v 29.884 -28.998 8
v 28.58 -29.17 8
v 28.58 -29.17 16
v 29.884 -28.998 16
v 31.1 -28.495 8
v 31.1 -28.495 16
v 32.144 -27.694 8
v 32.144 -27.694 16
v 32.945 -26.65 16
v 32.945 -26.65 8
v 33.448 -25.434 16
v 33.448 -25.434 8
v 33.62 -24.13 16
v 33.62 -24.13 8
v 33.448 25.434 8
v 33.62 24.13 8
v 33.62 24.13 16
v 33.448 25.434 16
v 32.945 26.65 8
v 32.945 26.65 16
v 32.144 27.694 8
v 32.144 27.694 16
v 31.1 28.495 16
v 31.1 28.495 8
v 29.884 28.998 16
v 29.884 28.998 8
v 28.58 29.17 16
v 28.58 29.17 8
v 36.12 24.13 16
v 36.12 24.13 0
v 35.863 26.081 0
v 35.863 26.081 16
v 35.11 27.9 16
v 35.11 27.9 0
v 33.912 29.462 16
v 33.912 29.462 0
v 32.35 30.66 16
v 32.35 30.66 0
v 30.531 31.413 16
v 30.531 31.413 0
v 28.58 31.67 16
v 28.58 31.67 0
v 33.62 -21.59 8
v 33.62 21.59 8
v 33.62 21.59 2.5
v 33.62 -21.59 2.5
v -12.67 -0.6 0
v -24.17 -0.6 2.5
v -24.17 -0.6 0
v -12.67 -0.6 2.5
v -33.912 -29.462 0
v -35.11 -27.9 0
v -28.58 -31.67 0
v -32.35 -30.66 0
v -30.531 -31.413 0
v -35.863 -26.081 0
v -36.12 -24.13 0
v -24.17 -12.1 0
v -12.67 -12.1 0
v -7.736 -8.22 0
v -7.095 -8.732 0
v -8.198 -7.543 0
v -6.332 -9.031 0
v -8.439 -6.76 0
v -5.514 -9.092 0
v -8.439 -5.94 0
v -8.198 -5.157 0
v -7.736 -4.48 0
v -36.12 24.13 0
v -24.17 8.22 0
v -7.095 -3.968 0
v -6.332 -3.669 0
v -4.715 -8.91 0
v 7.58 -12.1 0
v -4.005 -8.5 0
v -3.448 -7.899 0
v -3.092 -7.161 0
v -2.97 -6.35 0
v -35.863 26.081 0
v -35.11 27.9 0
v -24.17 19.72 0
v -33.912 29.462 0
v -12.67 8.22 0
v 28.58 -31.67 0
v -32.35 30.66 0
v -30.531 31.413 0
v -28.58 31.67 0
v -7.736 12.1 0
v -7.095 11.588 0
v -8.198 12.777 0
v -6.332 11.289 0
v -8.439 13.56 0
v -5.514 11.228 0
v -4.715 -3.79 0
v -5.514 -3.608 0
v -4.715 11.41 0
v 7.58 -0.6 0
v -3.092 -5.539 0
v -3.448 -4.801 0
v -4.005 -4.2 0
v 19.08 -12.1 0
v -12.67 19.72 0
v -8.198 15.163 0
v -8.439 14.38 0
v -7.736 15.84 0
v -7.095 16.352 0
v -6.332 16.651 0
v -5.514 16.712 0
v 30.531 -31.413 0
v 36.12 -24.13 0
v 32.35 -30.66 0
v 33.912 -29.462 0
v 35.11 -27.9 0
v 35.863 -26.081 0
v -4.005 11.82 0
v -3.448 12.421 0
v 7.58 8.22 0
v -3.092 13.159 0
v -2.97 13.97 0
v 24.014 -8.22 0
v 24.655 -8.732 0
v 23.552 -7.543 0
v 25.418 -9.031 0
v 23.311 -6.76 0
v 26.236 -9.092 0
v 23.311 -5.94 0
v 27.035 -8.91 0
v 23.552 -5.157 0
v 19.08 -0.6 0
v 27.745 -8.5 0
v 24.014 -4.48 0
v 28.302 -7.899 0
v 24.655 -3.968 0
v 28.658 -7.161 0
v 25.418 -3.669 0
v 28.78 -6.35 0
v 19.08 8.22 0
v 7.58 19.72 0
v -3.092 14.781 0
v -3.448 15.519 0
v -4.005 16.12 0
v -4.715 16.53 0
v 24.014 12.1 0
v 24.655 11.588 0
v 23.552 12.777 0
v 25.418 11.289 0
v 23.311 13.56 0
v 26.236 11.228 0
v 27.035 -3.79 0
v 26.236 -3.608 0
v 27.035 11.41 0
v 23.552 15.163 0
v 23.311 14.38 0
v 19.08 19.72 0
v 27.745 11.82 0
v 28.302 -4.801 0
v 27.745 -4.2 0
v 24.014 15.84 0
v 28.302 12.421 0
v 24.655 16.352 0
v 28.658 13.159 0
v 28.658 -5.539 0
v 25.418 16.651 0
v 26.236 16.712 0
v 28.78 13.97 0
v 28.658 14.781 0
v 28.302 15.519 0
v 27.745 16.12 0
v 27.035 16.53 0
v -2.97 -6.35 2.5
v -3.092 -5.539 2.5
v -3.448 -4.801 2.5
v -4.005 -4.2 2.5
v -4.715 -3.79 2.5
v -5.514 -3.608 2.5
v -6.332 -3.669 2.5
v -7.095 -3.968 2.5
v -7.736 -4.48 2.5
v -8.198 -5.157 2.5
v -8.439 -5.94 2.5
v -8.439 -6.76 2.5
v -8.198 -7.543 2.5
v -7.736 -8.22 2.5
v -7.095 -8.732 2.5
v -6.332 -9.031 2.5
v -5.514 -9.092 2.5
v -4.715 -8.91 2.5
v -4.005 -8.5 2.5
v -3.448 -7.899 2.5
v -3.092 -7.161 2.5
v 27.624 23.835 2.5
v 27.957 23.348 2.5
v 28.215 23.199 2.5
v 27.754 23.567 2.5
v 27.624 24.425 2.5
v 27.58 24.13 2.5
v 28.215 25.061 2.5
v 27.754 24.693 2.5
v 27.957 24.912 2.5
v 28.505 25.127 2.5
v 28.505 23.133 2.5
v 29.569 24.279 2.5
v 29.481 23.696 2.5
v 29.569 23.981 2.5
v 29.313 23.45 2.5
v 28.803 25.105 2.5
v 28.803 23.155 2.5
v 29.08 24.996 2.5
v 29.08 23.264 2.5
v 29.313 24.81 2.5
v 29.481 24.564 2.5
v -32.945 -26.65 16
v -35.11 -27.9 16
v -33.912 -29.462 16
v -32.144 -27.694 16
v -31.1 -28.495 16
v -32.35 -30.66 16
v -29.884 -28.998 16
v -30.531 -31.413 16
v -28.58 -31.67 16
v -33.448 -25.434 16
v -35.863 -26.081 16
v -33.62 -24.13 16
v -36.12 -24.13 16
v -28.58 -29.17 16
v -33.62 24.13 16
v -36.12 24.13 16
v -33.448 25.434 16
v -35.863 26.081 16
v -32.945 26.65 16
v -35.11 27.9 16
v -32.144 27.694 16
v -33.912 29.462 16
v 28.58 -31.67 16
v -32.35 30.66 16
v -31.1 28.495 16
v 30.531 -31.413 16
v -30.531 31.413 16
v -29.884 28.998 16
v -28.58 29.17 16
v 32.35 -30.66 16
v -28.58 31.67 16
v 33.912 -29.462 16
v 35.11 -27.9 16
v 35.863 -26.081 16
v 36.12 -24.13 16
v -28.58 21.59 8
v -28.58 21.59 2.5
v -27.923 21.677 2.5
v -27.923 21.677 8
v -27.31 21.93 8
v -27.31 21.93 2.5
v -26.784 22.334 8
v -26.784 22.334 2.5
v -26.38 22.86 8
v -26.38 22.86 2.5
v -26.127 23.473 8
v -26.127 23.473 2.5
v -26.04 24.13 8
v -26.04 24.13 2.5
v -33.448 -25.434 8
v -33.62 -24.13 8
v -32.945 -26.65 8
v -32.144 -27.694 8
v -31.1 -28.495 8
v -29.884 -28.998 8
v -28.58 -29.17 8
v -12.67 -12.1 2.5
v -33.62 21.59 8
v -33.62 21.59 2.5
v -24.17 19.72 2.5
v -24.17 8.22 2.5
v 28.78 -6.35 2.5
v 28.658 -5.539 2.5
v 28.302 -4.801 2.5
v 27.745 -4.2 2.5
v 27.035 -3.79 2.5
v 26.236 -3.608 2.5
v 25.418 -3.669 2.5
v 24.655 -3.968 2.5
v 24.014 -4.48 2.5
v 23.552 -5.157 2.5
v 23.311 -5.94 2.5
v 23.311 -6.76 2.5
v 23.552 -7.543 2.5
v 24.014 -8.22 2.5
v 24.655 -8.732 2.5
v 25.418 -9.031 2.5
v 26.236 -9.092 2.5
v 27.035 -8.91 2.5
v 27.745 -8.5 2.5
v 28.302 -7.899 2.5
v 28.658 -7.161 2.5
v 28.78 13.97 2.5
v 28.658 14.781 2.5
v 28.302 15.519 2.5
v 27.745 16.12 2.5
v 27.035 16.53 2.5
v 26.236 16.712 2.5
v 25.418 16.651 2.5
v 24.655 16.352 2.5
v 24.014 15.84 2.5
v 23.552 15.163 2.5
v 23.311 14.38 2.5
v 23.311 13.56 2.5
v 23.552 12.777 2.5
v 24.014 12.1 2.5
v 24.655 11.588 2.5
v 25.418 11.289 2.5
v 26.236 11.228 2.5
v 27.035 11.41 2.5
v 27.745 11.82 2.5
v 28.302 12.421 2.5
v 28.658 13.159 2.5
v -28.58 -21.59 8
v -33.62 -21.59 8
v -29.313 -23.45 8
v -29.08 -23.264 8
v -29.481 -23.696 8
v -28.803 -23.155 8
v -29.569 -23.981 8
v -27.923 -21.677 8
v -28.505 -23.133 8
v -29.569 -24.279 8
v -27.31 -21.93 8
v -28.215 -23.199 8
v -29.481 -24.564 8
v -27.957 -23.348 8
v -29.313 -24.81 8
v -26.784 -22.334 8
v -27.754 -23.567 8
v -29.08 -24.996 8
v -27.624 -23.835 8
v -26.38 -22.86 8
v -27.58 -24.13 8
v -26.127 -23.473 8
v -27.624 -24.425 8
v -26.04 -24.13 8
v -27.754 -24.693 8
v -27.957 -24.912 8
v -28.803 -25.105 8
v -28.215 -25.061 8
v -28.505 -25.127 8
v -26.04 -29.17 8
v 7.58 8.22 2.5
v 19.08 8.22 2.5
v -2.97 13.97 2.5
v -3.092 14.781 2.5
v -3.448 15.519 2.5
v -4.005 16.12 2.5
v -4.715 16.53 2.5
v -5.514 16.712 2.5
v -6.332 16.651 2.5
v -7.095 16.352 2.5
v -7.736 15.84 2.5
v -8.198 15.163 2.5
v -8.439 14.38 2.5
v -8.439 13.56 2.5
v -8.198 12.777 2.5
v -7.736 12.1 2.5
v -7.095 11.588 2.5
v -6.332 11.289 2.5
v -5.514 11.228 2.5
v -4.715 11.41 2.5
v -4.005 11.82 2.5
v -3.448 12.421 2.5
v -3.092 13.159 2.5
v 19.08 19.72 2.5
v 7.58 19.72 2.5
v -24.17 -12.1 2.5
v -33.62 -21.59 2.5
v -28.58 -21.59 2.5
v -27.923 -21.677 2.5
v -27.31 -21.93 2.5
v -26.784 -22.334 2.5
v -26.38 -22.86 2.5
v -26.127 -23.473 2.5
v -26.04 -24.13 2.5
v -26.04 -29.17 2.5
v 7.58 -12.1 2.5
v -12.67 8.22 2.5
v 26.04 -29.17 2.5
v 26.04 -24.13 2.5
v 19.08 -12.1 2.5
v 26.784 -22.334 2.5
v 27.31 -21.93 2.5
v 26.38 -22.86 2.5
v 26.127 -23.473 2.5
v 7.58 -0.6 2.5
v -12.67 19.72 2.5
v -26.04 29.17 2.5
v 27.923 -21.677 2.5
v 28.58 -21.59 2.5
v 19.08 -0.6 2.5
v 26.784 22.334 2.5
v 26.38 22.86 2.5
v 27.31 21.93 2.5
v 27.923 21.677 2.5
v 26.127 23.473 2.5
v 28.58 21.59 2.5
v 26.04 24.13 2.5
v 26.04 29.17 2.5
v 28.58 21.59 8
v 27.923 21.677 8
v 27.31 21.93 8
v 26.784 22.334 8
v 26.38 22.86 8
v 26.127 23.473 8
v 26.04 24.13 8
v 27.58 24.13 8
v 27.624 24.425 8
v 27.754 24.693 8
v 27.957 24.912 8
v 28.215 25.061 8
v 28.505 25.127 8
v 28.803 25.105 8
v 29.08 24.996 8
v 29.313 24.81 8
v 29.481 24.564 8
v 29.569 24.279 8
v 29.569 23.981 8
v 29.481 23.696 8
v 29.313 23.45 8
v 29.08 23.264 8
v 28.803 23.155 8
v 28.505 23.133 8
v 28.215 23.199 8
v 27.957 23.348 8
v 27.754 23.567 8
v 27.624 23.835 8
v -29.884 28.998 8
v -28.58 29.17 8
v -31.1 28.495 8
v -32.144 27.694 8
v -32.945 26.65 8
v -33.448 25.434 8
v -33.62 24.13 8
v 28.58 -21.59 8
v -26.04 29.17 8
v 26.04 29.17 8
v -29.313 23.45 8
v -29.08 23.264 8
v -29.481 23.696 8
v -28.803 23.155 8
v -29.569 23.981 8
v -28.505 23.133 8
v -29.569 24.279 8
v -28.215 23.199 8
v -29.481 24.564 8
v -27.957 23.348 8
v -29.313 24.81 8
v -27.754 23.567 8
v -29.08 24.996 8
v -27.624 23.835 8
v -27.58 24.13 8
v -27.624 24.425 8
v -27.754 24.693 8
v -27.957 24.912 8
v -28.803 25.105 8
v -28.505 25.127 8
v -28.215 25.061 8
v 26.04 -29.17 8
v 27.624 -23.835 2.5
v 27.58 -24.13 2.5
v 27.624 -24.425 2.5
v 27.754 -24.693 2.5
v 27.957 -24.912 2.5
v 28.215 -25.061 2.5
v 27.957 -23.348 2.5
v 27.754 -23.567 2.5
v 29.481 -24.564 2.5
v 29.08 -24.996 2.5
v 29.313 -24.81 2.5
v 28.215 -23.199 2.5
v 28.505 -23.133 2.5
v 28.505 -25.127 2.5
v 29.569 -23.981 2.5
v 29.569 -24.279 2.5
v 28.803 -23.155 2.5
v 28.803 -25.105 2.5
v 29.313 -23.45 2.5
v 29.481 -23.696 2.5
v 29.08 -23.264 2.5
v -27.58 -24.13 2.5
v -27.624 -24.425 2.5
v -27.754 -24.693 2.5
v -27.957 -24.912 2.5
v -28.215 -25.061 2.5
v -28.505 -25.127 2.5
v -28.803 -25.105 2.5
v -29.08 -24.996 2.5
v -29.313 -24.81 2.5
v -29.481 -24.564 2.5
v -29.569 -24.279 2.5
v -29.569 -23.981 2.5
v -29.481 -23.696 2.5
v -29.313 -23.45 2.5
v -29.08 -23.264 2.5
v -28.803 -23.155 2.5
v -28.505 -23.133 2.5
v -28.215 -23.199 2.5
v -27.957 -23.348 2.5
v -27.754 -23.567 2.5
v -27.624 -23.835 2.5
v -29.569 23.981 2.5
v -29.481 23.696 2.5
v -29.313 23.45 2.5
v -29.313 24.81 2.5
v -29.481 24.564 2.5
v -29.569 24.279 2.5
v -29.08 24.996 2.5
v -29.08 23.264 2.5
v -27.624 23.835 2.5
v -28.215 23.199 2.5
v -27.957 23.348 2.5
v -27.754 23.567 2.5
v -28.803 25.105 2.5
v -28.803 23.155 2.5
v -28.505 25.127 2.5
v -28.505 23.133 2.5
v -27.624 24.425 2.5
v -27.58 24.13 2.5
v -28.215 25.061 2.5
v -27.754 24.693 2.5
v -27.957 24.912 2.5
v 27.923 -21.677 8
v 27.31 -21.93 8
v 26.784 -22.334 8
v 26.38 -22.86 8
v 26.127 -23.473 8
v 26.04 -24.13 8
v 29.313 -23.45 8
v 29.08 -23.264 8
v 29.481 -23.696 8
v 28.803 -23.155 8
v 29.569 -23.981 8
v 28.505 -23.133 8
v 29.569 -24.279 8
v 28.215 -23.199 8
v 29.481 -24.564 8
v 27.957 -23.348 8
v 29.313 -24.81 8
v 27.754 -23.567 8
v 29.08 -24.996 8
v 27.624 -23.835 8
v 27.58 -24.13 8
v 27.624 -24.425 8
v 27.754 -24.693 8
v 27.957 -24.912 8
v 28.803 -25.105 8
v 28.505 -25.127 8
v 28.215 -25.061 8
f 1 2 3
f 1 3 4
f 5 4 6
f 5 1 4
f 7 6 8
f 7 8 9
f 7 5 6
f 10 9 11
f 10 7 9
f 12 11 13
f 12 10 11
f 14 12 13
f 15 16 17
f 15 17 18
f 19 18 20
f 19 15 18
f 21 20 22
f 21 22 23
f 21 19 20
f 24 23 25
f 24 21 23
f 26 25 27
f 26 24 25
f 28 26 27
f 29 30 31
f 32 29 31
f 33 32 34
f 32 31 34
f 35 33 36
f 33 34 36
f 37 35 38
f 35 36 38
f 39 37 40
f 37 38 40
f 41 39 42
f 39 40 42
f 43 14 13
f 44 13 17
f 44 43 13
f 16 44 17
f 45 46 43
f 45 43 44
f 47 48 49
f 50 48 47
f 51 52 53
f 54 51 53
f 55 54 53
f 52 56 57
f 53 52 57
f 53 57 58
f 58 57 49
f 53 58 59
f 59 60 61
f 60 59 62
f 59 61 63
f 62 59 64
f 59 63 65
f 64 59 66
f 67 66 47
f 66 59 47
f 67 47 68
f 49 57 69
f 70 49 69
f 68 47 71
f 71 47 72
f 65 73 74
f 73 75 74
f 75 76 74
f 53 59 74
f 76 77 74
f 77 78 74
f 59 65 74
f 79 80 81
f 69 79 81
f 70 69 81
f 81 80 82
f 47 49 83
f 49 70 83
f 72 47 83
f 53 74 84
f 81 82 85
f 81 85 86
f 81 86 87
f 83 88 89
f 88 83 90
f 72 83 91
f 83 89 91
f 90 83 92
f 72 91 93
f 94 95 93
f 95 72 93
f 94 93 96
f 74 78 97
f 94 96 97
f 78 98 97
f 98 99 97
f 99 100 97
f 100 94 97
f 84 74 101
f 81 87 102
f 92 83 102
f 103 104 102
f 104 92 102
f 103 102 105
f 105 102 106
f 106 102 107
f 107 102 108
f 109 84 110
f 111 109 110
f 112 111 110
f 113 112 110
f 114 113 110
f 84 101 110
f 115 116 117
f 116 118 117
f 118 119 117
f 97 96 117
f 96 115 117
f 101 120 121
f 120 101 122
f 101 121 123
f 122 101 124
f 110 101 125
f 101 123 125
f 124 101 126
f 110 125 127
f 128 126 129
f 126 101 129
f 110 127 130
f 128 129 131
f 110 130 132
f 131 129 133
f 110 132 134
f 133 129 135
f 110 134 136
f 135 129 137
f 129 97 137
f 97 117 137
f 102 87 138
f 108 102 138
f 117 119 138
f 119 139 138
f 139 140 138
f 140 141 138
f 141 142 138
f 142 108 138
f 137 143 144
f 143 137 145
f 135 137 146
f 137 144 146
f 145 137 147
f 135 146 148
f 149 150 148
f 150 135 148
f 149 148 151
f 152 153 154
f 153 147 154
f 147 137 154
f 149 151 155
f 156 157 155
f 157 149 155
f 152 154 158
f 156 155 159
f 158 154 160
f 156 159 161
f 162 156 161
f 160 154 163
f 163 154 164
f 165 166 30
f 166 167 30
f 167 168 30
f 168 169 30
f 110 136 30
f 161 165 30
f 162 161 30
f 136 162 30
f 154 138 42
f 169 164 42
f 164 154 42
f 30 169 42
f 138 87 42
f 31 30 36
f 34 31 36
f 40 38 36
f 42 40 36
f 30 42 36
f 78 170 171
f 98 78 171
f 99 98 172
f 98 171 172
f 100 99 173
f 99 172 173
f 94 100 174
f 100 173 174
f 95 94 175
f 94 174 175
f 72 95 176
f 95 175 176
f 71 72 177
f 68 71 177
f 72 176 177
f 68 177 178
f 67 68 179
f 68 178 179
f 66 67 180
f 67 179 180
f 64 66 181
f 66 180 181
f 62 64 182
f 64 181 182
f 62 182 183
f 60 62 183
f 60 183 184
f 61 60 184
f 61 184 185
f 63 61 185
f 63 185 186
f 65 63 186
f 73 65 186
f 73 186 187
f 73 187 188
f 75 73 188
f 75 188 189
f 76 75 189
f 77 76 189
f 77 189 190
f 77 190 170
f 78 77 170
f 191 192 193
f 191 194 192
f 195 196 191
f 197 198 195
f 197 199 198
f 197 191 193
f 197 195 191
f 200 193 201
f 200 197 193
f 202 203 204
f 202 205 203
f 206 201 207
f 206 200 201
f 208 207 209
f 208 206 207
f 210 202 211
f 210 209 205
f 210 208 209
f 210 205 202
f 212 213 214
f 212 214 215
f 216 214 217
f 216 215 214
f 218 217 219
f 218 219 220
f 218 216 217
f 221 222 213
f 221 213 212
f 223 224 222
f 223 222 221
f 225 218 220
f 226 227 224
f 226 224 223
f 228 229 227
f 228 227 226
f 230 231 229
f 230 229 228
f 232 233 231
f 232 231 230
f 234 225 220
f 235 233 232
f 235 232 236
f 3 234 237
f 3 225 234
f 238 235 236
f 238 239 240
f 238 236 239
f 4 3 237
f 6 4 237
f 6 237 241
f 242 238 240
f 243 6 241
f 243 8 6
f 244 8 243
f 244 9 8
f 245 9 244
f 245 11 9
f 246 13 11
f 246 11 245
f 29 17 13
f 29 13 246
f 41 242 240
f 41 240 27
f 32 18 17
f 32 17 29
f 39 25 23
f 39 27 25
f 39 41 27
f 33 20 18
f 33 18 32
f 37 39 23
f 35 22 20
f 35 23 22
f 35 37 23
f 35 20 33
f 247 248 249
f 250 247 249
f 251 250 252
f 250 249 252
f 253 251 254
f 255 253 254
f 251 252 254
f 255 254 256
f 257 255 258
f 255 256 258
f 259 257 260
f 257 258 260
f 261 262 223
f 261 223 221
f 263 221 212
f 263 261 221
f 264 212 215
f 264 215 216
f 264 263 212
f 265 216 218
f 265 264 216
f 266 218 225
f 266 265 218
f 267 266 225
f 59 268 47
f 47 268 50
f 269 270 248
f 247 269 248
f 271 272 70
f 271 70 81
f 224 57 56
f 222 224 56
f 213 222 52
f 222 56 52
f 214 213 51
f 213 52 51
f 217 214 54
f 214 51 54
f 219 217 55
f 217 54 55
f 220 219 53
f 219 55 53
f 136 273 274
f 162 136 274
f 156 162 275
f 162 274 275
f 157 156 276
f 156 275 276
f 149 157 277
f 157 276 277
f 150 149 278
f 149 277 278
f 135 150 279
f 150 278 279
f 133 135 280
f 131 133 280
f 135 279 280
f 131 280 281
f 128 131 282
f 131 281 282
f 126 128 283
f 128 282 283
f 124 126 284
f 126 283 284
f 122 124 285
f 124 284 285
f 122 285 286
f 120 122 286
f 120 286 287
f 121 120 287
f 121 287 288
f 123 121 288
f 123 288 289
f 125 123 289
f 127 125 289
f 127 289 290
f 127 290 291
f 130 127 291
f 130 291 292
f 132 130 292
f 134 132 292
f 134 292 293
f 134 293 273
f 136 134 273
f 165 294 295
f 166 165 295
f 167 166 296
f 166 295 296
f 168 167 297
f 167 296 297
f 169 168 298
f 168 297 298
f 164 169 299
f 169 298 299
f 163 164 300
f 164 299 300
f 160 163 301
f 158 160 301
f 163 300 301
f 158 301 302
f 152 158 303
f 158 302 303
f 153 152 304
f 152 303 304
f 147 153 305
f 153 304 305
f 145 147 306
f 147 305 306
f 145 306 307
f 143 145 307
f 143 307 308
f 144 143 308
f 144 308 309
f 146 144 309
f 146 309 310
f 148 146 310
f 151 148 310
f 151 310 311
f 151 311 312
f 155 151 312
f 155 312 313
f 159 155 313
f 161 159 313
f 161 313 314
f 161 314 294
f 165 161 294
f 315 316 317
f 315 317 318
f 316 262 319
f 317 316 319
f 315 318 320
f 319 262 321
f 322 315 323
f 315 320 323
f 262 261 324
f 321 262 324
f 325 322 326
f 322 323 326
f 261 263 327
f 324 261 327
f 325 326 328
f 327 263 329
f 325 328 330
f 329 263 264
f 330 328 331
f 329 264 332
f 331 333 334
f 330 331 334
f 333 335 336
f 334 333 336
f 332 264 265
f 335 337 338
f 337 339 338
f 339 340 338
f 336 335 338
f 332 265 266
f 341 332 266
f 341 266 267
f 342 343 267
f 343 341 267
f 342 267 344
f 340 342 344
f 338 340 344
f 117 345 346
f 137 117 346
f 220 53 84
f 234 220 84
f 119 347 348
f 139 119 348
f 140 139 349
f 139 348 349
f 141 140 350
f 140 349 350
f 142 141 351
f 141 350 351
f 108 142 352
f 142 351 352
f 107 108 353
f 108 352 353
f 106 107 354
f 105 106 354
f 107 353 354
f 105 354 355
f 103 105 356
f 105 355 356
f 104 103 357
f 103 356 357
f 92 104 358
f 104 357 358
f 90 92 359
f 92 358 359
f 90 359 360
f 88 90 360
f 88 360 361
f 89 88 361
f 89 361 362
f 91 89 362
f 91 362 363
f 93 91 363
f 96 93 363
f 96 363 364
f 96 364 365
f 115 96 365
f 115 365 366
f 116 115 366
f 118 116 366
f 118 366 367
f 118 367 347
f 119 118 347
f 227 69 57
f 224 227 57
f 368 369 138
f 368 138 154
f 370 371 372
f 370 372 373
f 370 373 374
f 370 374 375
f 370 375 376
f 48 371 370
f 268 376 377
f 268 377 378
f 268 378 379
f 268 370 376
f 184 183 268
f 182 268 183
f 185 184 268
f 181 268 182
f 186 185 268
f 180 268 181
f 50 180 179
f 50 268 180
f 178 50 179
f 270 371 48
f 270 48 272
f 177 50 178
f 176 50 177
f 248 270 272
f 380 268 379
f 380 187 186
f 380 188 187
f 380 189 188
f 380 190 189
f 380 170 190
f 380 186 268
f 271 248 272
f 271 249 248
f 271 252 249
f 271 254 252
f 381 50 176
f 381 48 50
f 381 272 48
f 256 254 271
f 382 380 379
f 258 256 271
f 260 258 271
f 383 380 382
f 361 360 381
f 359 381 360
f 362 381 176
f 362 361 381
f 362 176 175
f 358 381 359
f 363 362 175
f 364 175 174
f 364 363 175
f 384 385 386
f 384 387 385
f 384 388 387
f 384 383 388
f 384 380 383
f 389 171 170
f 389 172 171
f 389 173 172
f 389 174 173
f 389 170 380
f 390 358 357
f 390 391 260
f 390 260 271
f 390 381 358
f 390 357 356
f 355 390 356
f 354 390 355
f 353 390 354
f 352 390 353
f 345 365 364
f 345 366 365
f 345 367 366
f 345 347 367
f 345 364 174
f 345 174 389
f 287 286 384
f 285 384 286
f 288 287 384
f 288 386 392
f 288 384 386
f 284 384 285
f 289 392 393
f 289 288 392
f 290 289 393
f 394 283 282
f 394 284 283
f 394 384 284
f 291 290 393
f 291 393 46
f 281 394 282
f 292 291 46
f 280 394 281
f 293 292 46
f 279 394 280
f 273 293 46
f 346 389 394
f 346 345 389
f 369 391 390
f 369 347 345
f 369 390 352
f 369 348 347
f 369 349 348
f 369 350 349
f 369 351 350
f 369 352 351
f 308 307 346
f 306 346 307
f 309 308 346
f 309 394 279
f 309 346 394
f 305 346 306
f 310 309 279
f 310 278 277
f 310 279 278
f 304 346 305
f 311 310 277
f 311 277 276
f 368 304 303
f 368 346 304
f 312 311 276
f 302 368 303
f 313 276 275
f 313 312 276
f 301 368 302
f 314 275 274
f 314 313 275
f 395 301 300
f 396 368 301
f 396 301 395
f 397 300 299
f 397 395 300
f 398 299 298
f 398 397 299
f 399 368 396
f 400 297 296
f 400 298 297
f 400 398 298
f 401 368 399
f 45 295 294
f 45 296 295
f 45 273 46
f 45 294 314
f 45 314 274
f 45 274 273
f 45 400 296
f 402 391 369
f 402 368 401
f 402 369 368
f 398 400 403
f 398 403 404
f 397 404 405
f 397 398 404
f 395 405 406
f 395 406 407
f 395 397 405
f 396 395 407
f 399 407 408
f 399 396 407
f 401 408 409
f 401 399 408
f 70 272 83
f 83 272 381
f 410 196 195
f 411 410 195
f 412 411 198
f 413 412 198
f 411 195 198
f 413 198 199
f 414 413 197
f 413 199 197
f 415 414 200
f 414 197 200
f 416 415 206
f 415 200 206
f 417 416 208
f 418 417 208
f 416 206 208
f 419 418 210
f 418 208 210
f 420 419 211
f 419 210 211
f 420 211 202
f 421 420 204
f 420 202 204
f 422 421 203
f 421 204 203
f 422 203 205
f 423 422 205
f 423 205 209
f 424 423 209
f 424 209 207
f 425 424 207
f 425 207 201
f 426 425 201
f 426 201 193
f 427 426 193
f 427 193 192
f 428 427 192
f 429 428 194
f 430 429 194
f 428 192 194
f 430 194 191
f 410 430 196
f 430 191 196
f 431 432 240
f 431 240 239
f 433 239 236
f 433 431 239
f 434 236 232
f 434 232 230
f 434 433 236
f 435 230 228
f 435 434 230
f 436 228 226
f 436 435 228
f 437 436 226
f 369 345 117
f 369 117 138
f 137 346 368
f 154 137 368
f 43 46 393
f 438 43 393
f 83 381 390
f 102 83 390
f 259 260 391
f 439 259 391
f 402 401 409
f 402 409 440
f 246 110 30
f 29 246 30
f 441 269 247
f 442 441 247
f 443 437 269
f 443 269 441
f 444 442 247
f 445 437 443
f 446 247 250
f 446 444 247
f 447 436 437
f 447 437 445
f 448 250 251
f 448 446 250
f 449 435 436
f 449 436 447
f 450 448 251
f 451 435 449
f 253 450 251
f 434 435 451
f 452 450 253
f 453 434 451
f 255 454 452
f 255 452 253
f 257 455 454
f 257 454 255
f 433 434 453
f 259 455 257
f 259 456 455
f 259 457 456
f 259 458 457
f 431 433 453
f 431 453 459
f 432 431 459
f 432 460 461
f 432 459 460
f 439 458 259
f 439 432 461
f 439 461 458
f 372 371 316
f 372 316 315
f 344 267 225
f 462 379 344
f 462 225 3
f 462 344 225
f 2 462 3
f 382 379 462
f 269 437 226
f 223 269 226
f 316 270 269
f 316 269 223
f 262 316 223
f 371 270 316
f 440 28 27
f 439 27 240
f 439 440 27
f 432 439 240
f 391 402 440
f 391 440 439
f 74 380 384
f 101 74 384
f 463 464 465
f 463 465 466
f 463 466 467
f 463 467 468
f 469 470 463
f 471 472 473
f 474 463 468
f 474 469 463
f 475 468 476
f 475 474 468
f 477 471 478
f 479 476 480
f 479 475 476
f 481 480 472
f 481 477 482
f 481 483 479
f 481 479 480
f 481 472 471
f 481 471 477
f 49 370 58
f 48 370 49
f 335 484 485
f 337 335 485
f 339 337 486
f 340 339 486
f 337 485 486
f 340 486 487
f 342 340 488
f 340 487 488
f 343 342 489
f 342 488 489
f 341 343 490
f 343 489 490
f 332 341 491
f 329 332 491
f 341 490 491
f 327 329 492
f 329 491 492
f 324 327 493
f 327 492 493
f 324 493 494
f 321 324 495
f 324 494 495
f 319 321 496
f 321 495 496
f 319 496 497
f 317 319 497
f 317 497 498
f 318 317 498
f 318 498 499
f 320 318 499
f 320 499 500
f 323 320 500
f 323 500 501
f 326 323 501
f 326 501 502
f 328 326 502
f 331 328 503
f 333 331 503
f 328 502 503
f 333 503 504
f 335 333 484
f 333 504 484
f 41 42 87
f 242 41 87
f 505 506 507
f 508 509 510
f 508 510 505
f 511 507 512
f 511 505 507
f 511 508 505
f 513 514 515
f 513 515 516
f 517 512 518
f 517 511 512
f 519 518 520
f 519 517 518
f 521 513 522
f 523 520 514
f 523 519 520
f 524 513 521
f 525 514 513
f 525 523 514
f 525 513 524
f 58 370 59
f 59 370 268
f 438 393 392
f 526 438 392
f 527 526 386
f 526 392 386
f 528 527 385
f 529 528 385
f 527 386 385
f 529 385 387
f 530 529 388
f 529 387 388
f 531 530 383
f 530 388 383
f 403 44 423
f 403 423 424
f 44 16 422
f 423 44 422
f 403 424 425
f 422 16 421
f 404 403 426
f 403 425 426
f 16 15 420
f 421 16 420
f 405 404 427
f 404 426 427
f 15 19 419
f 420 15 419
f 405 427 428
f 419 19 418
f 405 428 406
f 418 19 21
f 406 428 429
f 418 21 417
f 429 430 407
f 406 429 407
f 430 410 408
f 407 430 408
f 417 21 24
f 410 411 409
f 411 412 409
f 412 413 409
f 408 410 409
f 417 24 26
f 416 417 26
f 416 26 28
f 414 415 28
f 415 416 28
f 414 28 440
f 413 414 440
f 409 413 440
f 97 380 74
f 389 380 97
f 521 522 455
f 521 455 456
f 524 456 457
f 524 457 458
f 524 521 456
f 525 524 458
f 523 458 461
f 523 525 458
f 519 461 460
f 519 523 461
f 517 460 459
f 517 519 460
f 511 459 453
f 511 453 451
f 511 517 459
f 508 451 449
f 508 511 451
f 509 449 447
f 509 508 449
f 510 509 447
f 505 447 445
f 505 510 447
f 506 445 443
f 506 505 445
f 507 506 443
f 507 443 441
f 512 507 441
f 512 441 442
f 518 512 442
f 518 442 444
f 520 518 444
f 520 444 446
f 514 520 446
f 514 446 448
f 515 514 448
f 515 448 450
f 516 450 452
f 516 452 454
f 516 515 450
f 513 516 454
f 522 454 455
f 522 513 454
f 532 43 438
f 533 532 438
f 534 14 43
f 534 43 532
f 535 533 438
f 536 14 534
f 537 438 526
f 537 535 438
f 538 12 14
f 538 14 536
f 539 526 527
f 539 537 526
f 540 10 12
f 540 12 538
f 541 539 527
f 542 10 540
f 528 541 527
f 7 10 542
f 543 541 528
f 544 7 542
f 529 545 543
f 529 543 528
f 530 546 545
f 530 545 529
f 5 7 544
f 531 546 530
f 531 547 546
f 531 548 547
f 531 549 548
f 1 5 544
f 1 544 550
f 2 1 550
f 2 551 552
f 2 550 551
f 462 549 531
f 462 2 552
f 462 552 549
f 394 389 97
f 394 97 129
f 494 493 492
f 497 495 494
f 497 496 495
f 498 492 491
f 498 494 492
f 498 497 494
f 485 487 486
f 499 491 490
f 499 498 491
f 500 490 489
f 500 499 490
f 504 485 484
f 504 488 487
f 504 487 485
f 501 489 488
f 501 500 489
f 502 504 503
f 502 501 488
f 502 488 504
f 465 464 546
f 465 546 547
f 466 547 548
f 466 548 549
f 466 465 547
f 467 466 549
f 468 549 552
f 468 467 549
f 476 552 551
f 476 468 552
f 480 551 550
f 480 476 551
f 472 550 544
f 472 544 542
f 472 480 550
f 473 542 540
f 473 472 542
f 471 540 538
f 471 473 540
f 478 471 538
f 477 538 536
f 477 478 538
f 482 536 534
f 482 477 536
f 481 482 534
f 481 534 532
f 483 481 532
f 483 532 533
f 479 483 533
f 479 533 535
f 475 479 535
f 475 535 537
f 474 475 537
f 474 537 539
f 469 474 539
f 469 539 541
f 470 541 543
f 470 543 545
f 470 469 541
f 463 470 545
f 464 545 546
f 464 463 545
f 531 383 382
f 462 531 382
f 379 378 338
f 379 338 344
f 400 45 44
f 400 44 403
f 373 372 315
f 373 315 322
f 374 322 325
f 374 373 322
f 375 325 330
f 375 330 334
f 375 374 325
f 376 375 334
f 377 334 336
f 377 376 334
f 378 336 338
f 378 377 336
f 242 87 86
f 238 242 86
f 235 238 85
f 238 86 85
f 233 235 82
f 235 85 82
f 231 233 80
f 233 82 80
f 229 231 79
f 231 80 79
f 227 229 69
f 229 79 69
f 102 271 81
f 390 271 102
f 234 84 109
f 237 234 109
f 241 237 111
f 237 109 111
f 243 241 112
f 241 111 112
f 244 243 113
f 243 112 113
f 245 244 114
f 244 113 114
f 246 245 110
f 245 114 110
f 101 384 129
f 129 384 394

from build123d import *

# Parameters (mm, degrees)
F1_DEPTH         = 16
F2_T             = -2.5
F3_R             = 1
F4_DEPTH         = 5.5
F4_COPIES2_COUNT = 2
F5_W             = 11.5
F5_H             = 11.5
F5_R             = 2.75
F6_DEPTH         = 2.501


# Not quite as in the source:
# - a pattern or mirror of a feature is missing from the dataset's text; its kind, count and spacing are read off the source's solid


with BuildPart() as f1:
    # F0 (on Top) → F1 (new body)
    with BuildSketch(Plane.XY):
        with BuildLine():
            ThreePointArc((36.12, 24.13), (33.9115851301, 29.4615851301), (28.58, 31.67))
            Line((28.58, 31.67), (-28.58, 31.67))
            ThreePointArc((-28.58, 31.67), (-33.9115851301, 29.4615851301), (-36.12, 24.13))
            Line((-36.12, 24.13), (-36.12, -24.13))
            ThreePointArc((-36.12, -24.13), (-33.9115851301, -29.4615851301), (-28.58, -31.67))
            Line((-28.58, -31.67), (28.58, -31.67))
            ThreePointArc((28.58, -31.67), (33.9115851301, -29.4615851301), (36.12, -24.13))
            Line((36.12, -24.13), (36.12, 24.13))
        make_face()
    extrude(amount=F1_DEPTH)

    # F2
    f2_openings = [f1.faces().sort_by_distance(p)[0] for p in [
        (0, 0, 16),
    ]]
    offset(amount=F2_T, openings=f2_openings)

    # F3 (on face) → F4 (join)
    with BuildSketch(Plane.XY.offset(2.5)):
        with BuildLine():
            Line((-26.04, 24.13), (-26.04, 29.17))
            Line((-26.04, 29.17), (-28.58, 29.17))
            ThreePointArc((-28.58, 29.17), (-32.1438181772, 27.6938181772), (-33.62, 24.13))
            Line((-33.62, 24.13), (-33.62, 21.59))
            Line((-33.62, 21.59), (-28.58, 21.59))
            ThreePointArc((-28.58, 21.59), (-26.7839487758, 22.3339487758), (-26.04, 24.13))
        make_face()
        with Locations((-28.58, 24.13)):
            Circle(F3_R, mode=Mode.SUBTRACT)
    f4 = extrude(amount=F4_DEPTH)

    # F4_copies: F4 across plane
    add(f4.mirror(Plane(origin=(0, 0, 0), x_dir=(0, 0, 1), z_dir=(1, 0, 0))))

    # F4_copies1: F4 across plane
    add(f4.mirror(Plane(origin=(0, 0, 0), x_dir=(0, 0, -1), z_dir=(0, -1, 0))))

    # F4_copies2: F4 ×2 about axis
    f4_copies2_axis = Axis((0, 0, 0), (0, 0, 1))
    for i in range(1, F4_COPIES2_COUNT):
        add(f4.rotate(f4_copies2_axis, i * 360 / F4_COPIES2_COUNT))

    # F5 (on face) → F6 (cut, through all)
    with BuildSketch(Plane.XY.offset(2.5)):
        with Locations((-18.42, 13.97)):
            Rectangle(F5_W, F5_H)
        with Locations((-5.72, 13.97)):
            Circle(F5_R)
        with Locations((-18.42, -6.35)):
            Rectangle(F5_W, F5_H)
        with Locations((-5.72, -6.35)):
            Circle(F5_R)
        with Locations((13.33, 13.97)):
            Rectangle(F5_W, F5_H)
        with Locations((26.03, 13.97)):
            Circle(F5_R)
        with Locations((13.33, -6.35)):
            Rectangle(F5_W, F5_H)
        with Locations((26.03, -6.35)):
            Circle(F5_R)
    extrude(amount=-F6_DEPTH, mode=Mode.SUBTRACT)


solid = f1.part
